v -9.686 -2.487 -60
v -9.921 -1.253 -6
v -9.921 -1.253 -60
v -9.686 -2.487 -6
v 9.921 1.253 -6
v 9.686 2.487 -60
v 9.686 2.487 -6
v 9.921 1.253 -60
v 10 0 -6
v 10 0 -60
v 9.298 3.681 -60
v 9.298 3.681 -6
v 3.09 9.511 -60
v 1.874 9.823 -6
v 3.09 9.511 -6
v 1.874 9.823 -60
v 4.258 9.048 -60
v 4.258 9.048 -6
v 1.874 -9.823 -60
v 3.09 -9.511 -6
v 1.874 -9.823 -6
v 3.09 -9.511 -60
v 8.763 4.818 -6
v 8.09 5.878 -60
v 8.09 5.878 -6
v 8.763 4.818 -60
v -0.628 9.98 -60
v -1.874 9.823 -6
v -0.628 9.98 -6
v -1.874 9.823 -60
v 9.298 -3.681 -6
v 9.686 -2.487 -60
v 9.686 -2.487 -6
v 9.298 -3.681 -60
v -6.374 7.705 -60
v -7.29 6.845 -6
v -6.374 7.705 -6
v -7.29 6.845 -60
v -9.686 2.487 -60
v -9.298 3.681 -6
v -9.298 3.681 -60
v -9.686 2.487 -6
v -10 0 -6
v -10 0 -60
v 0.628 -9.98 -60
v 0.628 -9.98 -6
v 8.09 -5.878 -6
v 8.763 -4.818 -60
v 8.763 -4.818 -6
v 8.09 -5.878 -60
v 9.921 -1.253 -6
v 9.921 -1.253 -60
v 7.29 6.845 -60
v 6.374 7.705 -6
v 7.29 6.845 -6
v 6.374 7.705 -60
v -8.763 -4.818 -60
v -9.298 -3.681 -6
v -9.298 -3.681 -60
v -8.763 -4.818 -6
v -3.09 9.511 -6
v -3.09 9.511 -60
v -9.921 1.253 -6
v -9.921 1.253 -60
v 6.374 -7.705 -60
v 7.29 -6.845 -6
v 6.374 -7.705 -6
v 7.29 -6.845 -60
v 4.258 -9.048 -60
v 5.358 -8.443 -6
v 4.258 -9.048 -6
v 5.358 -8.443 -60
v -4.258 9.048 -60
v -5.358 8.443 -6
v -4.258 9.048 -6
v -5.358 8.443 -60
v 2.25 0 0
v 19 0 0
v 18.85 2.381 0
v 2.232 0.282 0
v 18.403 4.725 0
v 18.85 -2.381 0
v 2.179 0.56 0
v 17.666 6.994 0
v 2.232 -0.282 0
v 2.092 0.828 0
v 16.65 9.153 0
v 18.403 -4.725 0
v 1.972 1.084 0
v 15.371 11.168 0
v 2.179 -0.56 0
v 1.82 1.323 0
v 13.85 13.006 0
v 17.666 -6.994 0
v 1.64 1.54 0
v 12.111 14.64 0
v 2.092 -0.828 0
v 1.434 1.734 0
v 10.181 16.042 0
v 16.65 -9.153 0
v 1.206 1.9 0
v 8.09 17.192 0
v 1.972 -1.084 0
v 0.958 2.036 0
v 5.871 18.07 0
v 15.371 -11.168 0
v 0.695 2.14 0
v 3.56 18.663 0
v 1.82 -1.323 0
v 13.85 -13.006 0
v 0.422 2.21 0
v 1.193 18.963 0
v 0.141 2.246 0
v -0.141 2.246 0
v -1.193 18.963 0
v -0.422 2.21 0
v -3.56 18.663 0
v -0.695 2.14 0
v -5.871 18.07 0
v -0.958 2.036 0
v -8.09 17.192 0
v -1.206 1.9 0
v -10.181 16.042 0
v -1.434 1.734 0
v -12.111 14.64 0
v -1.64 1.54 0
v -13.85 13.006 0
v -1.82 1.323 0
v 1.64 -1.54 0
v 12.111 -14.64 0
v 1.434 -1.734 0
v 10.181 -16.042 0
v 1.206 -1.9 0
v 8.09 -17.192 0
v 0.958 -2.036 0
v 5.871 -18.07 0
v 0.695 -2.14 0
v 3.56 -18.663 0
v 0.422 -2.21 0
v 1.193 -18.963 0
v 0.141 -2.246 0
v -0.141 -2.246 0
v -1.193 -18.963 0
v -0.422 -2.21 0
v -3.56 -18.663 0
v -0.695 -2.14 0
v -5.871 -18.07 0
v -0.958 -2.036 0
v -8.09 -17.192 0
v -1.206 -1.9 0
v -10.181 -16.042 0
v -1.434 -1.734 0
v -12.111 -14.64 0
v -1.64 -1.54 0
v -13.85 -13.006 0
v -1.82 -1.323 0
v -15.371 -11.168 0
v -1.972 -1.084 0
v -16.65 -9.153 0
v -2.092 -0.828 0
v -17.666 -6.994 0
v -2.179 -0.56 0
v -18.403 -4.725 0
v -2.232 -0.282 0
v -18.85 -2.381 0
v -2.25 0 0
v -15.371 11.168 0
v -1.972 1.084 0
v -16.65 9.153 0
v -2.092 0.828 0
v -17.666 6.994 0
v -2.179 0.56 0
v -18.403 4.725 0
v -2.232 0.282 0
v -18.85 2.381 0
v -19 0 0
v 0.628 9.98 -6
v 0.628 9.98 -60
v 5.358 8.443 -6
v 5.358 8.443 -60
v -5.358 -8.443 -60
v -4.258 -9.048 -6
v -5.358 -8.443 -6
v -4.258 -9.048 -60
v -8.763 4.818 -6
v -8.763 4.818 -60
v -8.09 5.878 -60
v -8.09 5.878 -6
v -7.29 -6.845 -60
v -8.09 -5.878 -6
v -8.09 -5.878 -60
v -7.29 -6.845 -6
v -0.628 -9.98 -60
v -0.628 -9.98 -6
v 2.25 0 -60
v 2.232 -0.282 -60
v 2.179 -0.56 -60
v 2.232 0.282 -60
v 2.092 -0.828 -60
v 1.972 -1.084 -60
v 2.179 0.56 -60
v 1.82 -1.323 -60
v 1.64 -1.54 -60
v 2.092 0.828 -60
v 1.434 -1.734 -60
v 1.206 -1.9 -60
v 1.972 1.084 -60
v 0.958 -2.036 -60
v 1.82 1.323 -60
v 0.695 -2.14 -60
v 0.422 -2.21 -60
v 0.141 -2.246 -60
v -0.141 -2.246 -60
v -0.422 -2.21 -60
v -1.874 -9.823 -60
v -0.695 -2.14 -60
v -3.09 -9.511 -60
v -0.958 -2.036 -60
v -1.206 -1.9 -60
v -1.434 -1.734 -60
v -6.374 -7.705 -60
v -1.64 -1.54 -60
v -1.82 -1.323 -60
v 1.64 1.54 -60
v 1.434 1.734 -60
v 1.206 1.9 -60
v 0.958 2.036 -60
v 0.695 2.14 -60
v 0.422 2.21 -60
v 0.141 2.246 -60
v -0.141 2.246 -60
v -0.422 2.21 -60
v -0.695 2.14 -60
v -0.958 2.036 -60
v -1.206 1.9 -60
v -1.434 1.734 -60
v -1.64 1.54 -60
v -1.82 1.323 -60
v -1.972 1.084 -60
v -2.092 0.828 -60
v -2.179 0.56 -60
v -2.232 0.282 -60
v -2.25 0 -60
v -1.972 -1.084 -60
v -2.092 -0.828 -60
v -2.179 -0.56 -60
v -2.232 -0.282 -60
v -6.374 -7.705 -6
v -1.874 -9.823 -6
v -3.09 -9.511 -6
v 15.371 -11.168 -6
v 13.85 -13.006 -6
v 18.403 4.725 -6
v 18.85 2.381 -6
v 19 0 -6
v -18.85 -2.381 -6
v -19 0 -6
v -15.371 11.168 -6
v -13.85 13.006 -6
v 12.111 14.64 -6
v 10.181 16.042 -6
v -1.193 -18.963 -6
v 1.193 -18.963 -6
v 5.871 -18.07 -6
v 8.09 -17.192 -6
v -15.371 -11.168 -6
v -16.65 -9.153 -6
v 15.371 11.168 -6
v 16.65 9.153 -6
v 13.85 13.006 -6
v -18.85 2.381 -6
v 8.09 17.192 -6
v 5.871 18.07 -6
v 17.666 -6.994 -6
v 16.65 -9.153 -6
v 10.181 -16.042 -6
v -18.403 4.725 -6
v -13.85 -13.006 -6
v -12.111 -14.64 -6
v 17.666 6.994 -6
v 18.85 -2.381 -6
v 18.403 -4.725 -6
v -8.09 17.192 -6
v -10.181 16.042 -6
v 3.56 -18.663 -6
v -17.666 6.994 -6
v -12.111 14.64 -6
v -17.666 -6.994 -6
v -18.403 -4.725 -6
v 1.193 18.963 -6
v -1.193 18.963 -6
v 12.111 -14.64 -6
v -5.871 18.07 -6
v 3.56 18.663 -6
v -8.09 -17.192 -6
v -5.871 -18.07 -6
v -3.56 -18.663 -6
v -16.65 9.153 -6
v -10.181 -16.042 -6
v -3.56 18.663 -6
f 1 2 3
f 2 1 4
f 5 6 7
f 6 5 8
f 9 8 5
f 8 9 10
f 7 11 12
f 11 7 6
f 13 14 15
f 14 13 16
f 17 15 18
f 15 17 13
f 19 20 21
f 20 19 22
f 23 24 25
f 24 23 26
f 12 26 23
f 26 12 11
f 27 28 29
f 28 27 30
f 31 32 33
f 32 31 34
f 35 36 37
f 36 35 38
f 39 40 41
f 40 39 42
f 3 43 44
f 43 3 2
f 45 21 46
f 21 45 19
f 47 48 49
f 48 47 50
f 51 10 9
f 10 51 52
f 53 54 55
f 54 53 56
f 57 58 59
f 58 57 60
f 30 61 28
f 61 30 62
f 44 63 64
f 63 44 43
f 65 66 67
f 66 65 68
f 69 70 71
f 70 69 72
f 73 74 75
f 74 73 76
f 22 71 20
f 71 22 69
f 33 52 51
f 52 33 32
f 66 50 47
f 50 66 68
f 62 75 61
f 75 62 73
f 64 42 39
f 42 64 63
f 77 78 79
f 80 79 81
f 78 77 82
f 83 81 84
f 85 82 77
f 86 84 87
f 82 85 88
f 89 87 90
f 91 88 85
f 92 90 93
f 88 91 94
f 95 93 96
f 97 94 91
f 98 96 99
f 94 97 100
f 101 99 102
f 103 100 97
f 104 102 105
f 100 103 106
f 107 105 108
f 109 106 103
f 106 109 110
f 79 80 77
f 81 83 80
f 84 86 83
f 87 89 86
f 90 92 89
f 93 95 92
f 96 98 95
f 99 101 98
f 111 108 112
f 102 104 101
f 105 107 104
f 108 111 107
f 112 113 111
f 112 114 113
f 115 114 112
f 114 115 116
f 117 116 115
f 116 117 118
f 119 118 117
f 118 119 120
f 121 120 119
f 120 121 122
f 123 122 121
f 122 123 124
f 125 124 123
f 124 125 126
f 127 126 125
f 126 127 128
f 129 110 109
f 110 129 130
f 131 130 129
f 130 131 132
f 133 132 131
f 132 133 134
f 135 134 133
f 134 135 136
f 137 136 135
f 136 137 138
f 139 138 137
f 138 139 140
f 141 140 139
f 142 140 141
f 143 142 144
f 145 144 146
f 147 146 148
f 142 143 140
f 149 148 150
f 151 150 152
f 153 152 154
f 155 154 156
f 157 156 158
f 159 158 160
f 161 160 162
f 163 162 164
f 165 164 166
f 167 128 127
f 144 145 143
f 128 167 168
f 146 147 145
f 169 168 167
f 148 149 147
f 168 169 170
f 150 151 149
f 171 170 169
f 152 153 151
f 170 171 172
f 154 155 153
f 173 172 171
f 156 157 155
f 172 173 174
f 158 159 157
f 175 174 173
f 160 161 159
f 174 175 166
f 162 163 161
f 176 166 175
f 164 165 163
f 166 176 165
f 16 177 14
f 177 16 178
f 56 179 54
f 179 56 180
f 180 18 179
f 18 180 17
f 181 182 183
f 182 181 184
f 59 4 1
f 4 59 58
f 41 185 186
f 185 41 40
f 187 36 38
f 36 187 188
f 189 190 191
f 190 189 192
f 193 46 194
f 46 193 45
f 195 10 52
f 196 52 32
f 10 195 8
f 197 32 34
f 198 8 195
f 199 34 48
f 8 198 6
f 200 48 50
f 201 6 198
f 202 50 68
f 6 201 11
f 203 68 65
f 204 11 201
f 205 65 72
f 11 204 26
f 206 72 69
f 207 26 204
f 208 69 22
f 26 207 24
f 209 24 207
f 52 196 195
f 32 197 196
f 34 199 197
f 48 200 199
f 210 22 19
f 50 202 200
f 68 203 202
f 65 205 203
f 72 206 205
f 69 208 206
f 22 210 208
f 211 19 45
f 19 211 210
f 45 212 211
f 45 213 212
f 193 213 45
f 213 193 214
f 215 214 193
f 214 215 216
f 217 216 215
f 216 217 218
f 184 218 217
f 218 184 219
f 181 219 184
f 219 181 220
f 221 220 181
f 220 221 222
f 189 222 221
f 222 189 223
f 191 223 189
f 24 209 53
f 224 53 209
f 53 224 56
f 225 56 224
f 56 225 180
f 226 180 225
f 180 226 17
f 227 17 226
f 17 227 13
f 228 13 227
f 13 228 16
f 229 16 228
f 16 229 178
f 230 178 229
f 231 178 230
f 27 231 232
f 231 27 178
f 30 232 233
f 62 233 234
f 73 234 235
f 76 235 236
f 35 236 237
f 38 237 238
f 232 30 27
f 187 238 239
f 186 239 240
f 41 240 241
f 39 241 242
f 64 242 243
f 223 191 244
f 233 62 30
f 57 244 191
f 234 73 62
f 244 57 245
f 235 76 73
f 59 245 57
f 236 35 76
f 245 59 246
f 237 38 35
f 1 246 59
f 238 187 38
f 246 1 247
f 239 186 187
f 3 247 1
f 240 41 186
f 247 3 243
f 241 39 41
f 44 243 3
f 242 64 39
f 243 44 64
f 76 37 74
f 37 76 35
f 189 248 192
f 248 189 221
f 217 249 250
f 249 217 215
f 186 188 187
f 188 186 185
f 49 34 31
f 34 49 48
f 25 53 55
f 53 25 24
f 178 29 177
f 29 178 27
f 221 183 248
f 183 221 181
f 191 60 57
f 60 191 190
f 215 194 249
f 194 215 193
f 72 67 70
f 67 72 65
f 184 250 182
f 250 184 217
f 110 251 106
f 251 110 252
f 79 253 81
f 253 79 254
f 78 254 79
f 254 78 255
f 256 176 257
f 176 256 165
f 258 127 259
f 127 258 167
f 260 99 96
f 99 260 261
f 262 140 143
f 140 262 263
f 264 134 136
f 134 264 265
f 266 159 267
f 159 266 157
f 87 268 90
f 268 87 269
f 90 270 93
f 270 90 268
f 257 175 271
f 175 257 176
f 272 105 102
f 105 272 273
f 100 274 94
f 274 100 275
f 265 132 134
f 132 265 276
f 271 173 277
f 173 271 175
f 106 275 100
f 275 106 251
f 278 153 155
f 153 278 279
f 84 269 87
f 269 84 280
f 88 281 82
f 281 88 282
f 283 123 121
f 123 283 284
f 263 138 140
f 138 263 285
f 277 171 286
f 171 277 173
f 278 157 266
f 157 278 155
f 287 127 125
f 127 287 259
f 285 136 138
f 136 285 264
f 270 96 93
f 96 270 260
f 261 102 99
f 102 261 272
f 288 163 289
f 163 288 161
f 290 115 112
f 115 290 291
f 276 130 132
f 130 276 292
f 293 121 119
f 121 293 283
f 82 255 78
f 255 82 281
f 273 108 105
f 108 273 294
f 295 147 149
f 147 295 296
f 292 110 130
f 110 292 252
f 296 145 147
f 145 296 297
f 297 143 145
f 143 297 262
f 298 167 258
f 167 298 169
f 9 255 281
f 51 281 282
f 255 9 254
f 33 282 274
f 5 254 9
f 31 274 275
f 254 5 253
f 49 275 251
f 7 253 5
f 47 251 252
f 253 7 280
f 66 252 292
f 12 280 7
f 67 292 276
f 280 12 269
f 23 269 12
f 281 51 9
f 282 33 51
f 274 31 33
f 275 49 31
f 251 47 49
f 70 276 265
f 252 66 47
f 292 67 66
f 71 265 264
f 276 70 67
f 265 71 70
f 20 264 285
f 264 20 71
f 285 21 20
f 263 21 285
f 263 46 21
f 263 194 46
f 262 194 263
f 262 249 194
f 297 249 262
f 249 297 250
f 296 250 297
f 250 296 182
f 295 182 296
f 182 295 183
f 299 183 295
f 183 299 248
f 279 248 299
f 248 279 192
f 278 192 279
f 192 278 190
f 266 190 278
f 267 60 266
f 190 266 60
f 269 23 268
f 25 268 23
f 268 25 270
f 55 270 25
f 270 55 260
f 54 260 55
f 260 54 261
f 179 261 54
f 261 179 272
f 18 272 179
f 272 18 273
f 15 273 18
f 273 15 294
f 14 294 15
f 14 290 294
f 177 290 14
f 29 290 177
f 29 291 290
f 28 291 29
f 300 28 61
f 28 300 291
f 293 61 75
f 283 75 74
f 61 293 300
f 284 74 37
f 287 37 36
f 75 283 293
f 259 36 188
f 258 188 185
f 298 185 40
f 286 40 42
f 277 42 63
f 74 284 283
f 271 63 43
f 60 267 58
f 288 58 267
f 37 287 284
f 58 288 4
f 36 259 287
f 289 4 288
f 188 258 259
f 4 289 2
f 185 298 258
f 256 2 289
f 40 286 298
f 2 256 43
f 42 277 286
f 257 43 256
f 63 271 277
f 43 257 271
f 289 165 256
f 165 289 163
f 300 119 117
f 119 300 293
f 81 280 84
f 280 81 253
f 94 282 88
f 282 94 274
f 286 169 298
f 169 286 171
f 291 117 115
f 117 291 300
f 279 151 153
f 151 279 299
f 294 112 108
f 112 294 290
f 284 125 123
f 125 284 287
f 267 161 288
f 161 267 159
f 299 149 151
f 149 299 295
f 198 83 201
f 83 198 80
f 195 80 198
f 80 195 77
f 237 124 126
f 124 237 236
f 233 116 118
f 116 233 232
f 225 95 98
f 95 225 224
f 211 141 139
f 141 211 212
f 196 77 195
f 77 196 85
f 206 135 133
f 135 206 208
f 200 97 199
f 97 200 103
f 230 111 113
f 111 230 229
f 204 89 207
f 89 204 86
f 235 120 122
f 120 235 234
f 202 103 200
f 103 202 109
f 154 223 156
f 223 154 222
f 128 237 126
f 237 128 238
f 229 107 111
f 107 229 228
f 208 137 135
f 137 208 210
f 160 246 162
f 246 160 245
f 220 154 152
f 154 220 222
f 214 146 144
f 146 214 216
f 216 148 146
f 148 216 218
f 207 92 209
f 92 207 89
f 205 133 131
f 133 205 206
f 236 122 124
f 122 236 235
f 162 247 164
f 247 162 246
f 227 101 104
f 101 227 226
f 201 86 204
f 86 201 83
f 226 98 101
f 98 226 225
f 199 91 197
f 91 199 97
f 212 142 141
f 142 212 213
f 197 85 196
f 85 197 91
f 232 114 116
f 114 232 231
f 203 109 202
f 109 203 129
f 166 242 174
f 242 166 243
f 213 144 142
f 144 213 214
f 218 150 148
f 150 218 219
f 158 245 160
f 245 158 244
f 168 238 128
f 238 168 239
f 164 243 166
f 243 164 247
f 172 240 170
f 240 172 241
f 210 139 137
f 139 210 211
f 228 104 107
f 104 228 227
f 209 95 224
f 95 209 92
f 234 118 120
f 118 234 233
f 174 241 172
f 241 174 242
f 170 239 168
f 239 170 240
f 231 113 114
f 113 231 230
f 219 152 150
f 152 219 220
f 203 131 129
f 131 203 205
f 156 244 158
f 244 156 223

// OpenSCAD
$fn = 50;


difference() {
	union() {
		translate(v = [0, 0, -60.0000000000]) {
			cylinder(h = 60, r = 10.0000000000);
		}
		translate(v = [0, 0, -6.0000000000]) {
			cylinder(h = 6, r = 19.0000000000);
		}
	}
	union() {
		#translate(v = [0, 0, -60]) {
			cylinder(h = 60, r = 2.2500000000);
		}
	}
}
